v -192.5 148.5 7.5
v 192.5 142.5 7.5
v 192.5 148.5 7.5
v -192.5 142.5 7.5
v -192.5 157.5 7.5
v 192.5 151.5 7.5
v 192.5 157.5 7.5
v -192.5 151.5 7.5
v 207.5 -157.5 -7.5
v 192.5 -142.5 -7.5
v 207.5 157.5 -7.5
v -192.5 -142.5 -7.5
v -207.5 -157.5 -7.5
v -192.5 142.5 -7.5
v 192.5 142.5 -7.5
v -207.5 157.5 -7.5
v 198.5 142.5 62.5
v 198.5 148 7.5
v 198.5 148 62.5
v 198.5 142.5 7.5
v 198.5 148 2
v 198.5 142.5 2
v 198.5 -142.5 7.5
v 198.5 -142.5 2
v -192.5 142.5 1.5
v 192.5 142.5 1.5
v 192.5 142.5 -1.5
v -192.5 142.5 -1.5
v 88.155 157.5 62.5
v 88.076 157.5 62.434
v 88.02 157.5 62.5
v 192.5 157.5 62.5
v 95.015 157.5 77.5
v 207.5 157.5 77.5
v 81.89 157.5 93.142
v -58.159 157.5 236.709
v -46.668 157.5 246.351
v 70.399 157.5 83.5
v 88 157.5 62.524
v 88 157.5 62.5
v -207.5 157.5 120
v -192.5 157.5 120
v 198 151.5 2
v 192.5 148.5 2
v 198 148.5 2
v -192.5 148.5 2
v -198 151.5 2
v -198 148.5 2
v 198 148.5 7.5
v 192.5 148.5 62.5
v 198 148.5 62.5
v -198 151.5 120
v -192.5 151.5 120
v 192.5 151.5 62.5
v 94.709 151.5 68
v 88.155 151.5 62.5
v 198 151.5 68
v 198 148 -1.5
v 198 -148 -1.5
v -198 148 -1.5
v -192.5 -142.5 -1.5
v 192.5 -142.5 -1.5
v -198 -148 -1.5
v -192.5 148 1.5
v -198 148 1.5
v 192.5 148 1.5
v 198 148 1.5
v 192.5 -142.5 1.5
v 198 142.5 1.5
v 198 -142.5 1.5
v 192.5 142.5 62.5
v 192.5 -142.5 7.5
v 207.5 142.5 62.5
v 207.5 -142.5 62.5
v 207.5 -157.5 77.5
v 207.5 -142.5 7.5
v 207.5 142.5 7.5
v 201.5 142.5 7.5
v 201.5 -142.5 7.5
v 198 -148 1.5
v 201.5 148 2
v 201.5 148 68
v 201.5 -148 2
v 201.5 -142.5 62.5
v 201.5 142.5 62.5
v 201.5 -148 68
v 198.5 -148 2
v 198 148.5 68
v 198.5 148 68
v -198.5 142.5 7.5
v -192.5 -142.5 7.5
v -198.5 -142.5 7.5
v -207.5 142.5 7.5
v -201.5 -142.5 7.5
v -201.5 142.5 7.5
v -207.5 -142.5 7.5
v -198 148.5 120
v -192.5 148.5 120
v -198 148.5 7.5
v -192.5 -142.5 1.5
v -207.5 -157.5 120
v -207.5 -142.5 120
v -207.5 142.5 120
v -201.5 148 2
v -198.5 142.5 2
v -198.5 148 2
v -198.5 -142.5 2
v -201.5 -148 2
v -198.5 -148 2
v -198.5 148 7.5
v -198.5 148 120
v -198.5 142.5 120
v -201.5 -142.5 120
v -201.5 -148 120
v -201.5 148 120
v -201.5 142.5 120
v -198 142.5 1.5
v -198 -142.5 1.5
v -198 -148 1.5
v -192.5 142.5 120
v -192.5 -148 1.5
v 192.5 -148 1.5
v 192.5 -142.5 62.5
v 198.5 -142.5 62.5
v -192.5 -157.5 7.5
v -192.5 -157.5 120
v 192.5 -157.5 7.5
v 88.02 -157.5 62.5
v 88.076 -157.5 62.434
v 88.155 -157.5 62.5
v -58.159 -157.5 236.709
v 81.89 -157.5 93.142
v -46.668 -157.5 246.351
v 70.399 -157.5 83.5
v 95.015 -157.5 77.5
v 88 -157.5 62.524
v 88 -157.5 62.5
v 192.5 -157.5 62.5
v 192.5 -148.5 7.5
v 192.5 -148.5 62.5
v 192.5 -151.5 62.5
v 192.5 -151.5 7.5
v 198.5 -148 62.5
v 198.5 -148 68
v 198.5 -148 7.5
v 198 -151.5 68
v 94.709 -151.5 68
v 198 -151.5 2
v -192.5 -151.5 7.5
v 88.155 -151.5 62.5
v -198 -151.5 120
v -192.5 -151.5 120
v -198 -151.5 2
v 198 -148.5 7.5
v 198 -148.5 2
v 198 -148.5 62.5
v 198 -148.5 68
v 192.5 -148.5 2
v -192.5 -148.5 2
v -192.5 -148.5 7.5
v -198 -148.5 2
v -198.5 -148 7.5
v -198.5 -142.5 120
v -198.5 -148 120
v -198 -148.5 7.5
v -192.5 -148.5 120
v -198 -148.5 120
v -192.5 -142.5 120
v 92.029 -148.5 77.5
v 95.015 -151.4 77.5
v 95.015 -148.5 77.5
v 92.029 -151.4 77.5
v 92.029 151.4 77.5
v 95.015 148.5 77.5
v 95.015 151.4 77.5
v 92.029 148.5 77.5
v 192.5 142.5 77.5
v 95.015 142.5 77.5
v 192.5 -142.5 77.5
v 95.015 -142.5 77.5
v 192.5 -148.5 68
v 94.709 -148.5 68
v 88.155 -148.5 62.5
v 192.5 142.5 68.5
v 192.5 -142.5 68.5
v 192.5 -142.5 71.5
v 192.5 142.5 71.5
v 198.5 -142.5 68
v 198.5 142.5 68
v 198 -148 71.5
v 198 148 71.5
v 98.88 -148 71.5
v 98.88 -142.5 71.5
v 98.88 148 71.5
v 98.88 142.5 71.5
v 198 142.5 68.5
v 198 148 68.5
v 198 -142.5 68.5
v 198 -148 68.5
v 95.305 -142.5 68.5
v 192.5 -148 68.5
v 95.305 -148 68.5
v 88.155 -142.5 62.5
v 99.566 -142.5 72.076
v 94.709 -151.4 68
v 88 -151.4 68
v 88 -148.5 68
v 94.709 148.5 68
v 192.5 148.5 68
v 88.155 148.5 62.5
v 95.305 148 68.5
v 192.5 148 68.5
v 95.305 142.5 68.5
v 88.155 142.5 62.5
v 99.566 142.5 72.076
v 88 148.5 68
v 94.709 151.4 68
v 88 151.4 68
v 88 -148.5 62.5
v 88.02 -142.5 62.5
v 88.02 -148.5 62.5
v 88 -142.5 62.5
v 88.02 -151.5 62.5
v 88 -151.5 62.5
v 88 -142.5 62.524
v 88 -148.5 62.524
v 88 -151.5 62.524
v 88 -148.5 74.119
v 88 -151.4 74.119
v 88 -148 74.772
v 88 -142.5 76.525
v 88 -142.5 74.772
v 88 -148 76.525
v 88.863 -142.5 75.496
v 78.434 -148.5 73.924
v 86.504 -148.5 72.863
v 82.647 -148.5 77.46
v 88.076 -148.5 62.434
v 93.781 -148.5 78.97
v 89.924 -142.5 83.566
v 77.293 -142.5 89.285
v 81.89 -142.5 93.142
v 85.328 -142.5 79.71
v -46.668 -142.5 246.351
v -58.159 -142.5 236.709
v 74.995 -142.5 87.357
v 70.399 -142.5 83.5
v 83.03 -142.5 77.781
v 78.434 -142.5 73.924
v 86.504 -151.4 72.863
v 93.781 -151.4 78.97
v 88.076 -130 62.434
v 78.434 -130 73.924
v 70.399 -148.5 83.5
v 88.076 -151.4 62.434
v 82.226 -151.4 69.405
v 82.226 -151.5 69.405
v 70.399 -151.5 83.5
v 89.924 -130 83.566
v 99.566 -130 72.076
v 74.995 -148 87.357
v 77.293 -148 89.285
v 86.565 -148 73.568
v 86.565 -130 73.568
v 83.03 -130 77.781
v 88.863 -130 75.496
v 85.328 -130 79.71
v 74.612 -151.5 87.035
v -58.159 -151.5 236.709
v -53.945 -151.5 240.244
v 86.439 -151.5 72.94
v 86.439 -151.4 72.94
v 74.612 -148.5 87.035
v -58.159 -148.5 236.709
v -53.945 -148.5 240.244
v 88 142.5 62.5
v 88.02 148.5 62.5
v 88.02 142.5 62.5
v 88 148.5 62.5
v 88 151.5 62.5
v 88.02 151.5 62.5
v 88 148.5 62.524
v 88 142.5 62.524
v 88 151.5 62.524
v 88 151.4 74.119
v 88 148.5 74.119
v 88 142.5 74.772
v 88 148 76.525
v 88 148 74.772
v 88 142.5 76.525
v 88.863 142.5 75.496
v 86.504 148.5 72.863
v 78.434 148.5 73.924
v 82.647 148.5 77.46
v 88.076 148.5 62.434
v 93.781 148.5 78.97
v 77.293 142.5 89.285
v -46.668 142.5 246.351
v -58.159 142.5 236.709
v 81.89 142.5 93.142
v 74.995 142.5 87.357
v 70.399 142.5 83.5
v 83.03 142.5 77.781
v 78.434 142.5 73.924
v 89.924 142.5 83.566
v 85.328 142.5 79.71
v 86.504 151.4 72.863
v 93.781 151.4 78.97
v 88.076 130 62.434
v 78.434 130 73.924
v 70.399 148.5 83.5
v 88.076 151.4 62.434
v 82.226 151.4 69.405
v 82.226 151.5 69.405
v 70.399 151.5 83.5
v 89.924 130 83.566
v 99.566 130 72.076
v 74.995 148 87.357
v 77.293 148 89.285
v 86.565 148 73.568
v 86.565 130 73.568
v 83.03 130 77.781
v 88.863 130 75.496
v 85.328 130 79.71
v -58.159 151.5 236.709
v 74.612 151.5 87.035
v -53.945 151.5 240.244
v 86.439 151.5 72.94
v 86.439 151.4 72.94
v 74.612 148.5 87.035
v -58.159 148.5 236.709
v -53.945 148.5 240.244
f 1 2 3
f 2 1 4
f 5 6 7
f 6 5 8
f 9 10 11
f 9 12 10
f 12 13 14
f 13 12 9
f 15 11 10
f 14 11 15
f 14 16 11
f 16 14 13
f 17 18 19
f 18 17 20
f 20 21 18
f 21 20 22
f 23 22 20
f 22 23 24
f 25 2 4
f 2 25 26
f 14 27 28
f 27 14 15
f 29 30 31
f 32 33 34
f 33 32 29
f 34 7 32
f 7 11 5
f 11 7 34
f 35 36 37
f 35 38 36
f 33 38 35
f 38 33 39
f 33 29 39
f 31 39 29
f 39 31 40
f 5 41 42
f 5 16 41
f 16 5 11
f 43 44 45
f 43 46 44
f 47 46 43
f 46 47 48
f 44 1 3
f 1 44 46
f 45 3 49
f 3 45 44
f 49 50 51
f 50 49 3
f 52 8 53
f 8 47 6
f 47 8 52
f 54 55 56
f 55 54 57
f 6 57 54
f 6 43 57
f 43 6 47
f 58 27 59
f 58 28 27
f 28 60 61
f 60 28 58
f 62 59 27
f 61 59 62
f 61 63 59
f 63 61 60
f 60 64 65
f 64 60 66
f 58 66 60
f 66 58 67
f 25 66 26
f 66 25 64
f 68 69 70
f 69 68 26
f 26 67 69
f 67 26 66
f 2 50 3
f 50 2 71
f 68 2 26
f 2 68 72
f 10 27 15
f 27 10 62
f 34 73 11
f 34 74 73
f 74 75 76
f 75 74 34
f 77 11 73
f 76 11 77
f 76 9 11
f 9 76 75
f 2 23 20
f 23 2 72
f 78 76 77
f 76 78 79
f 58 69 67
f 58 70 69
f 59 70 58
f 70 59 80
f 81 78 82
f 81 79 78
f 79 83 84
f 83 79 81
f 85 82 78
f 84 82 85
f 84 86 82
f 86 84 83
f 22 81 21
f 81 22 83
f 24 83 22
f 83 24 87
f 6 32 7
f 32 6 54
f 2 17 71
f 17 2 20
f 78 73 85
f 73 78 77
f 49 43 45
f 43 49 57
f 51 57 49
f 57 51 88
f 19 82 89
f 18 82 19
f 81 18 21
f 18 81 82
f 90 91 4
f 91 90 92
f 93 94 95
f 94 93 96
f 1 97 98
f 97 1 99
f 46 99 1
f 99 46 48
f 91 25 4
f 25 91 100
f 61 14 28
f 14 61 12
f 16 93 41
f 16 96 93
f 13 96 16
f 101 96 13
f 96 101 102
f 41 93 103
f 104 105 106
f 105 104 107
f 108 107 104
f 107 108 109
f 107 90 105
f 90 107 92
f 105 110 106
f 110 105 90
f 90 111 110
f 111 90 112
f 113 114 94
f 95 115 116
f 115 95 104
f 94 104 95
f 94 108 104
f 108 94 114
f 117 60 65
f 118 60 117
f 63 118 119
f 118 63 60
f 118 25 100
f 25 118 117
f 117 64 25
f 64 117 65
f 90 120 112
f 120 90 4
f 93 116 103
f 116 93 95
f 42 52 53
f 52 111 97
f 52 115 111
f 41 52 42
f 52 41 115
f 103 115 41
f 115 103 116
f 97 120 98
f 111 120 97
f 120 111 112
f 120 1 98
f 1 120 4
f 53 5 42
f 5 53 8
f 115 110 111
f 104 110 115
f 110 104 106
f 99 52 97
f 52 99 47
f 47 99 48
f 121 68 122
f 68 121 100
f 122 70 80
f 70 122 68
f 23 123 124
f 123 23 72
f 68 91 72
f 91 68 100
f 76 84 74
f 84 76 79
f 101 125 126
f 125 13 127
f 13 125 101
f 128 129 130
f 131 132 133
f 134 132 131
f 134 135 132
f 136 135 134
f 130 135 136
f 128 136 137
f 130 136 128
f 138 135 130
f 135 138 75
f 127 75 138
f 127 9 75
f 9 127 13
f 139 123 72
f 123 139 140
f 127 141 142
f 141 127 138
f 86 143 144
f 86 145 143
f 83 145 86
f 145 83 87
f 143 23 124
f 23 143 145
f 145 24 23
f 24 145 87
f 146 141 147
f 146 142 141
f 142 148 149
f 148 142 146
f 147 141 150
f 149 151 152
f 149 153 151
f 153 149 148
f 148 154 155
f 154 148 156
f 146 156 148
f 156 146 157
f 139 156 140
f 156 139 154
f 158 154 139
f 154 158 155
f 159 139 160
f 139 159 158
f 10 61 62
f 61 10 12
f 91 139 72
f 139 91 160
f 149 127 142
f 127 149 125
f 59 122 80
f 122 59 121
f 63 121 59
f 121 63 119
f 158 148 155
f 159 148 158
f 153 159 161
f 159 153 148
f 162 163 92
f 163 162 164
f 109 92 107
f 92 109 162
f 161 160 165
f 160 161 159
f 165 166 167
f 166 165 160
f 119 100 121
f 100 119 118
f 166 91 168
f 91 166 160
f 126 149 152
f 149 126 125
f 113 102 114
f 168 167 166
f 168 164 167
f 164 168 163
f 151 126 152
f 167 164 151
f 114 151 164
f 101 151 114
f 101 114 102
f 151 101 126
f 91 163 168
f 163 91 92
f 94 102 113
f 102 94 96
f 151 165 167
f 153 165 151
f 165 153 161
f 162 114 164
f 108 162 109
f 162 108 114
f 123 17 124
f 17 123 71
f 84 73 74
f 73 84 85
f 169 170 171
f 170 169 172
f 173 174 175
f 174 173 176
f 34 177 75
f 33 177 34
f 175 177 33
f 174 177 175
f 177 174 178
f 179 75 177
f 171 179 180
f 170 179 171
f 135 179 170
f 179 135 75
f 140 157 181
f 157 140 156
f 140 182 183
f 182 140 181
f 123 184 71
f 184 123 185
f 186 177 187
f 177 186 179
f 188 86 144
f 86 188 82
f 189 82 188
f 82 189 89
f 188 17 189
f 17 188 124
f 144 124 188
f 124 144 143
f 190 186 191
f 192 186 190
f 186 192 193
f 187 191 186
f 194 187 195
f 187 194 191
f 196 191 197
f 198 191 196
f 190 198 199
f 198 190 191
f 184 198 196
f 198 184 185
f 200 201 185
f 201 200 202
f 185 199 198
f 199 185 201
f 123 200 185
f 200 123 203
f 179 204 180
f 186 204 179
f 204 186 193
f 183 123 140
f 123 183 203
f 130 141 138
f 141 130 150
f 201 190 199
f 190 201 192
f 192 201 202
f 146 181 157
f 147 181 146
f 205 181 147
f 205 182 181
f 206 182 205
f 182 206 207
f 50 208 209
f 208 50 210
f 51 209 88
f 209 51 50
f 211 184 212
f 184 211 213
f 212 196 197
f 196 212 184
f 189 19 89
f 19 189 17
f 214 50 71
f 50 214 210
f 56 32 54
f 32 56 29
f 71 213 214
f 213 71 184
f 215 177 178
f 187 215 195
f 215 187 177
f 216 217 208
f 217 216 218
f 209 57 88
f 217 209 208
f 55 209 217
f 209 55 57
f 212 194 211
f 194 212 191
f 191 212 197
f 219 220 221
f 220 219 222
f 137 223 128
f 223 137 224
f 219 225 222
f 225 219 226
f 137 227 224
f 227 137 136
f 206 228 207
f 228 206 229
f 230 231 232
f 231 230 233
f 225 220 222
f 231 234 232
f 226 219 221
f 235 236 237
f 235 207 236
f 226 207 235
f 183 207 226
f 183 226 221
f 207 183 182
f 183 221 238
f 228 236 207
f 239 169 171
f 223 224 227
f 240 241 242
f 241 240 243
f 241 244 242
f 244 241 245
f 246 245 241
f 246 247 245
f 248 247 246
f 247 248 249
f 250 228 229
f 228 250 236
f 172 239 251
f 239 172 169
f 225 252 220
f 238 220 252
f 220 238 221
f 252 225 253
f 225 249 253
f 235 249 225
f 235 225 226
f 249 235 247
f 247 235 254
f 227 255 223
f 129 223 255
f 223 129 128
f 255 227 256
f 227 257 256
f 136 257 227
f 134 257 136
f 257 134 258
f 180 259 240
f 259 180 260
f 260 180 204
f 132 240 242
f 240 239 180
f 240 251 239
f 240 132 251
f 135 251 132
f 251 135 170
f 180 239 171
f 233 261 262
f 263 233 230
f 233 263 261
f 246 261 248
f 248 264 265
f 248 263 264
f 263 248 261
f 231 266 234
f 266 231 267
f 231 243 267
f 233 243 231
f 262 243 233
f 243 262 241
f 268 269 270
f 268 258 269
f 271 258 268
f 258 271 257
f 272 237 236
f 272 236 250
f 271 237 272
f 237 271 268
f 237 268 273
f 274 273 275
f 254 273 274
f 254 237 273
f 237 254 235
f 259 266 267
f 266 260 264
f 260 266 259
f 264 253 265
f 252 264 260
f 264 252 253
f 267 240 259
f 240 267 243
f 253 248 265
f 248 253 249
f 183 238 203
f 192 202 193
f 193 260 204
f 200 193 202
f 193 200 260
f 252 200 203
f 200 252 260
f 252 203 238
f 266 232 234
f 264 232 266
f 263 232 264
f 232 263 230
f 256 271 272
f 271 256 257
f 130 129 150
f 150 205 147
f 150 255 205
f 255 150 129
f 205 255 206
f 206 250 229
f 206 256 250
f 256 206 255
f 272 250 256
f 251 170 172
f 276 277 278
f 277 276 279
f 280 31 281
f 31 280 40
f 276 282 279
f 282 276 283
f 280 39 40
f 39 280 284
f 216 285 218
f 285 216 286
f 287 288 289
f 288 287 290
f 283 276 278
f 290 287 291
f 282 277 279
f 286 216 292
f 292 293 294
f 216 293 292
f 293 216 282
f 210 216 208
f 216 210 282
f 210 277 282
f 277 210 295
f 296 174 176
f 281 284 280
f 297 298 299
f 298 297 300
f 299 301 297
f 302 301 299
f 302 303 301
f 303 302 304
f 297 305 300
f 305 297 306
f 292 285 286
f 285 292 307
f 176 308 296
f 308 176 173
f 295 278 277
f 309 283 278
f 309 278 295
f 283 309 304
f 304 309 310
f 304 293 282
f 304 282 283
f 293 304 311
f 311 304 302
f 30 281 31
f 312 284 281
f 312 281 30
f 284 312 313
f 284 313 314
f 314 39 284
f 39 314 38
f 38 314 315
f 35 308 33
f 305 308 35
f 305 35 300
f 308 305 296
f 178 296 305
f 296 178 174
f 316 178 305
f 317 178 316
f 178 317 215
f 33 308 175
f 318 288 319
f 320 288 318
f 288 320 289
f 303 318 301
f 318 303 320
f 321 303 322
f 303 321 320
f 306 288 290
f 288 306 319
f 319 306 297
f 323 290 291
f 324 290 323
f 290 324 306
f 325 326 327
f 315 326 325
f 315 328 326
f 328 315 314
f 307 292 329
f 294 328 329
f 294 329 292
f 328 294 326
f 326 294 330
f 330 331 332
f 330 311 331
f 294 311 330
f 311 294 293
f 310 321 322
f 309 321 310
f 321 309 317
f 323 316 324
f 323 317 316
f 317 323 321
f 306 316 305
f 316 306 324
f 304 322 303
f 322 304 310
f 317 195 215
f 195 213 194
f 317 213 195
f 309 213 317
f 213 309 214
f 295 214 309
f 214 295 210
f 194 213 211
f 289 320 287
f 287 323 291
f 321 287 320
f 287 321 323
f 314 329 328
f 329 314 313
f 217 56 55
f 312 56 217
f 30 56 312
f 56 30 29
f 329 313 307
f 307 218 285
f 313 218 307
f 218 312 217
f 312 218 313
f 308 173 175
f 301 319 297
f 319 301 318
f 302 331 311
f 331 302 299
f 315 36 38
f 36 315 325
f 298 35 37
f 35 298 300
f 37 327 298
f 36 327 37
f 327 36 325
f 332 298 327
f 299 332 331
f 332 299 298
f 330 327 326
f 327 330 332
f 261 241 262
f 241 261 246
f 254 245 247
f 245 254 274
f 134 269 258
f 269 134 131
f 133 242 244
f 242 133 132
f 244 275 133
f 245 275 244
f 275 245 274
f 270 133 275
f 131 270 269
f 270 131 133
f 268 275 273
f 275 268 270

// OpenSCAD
$fn = 20;
union()
{
  union()
  {
    translate(v = [200, 150, 0])
    {
      rotate(a = [0, 0, 180], v = undef)
      {
        union()
        {
          translate(v = [100.75, 0, 0])
          {
            difference()
            {
              difference()
              {
                cube(size = [198.5, 15, 15], center = true);
                translate(v = [0, 0, 5.5])
                {
                  cube(size = [199.5, 3, 7], center = true);
                }
              }
              rotate(a = [-90, 0, 0], v = undef)
              {
                translate(v = [0, 0, 5.5])
                {
                  cube(size = [199.5, 3, 7], center = true);
                }
              }
            }
          }
          translate(v = [0, 75.75, 0])
          {
            rotate(a = [90, 0, 90], v = undef)
            {
              difference()
              {
                difference()
                {
                  cube(size = [148.5, 15, 15], center = true);
                  translate(v = [0, 0, 5.5])
                  {
                    cube(size = [149.5, 3, 7], center = true);
                  }
                }
                rotate(a = [-90, 0, 0], v = undef)
                {
                  translate(v = [0, 0, 5.5])
                  {
                    cube(size = [149.5, 3, 7], center = true);
                  }
                }
              }
            }
          }
          translate(v = [-2.95, -2.95, 0])
          {
            cube(size = [9.1, 9.1, 15], center = true);
          }
          translate(v = [0, 0, 25.75])
          {
            rotate(a = [0, 90, 0], v = undef)
            {
              difference()
              {
                difference()
                {
                  cube(size = [48.5, 15, 15], center = true);
                  translate(v = [0, 0, 5.5])
                  {
                    cube(size = [49.5, 3, 7], center = true);
                  }
                }
                rotate(a = [-90, 0, 0], v = undef)
                {
                  translate(v = [0, 0, 5.5])
                  {
                    cube(size = [49.5, 3, 7], center = true);
                  }
                }
              }
            }
          }
        }
      }
    }
    translate(v = [-200, 150, 0])
    {
      rotate(a = [0, 0, -90], v = undef)
      {
        union()
        {
          translate(v = [75.75, 0, 0])
          {
            difference()
            {
              difference()
              {
                cube(size = [148.5, 15, 15], center = true);
                translate(v = [0, 0, 5.5])
                {
                  cube(size = [149.5, 3, 7], center = true);
                }
              }
              rotate(a = [-90, 0, 0], v = undef)
              {
                translate(v = [0, 0, 5.5])
                {
                  cube(size = [149.5, 3, 7], center = true);
                }
              }
            }
          }
          translate(v = [0, 100.75, 0])
          {
            rotate(a = [90, 0, 90], v = undef)
            {
              difference()
              {
                difference()
                {
                  cube(size = [198.5, 15, 15], center = true);
                  translate(v = [0, 0, 5.5])
                  {
                    cube(size = [199.5, 3, 7], center = true);
                  }
                }
                rotate(a = [-90, 0, 0], v = undef)
                {
                  translate(v = [0, 0, 5.5])
                  {
                    cube(size = [199.5, 3, 7], center = true);
                  }
                }
              }
            }
          }
          translate(v = [-2.95, -2.95, 0])
          {
            cube(size = [9.1, 9.1, 15], center = true);
          }
          translate(v = [0, 0, 60.75])
          {
            rotate(a = [0, 90, 0], v = undef)
            {
              difference()
              {
                difference()
                {
                  cube(size = [118.5, 15, 15], center = true);
                  translate(v = [0, 0, 5.5])
                  {
                    cube(size = [119.5, 3, 7], center = true);
                  }
                }
                rotate(a = [-90, 0, 0], v = undef)
                {
                  translate(v = [0, 0, 5.5])
                  {
                    cube(size = [119.5, 3, 7], center = true);
                  }
                }
              }
            }
          }
        }
      }
    }
    translate(v = [200, -150, 0])
    {
      rotate(a = [0, 0, 90], v = undef)
      {
        union()
        {
          translate(v = [75.75, 0, 0])
          {
            difference()
            {
              difference()
              {
                cube(size = [148.5, 15, 15], center = true);
                translate(v = [0, 0, 5.5])
                {
                  cube(size = [149.5, 3, 7], center = true);
                }
              }
              rotate(a = [-90, 0, 0], v = undef)
              {
                translate(v = [0, 0, 5.5])
                {
                  cube(size = [149.5, 3, 7], center = true);
                }
              }
            }
          }
          translate(v = [0, 100.75, 0])
          {
            rotate(a = [90, 0, 90], v = undef)
            {
              difference()
              {
                difference()
                {
                  cube(size = [198.5, 15, 15], center = true);
                  translate(v = [0, 0, 5.5])
                  {
                    cube(size = [199.5, 3, 7], center = true);
                  }
                }
                rotate(a = [-90, 0, 0], v = undef)
                {
                  translate(v = [0, 0, 5.5])
                  {
                    cube(size = [199.5, 3, 7], center = true);
                  }
                }
              }
            }
          }
          translate(v = [-2.95, -2.95, 0])
          {
            cube(size = [9.1, 9.1, 15], center = true);
          }
          translate(v = [0, 0, 25.75])
          {
            rotate(a = [0, 90, 0], v = undef)
            {
              difference()
              {
                difference()
                {
                  cube(size = [48.5, 15, 15], center = true);
                  translate(v = [0, 0, 5.5])
                  {
                    cube(size = [49.5, 3, 7], center = true);
                  }
                }
                rotate(a = [-90, 0, 0], v = undef)
                {
                  translate(v = [0, 0, 5.5])
                  {
                    cube(size = [49.5, 3, 7], center = true);
                  }
                }
              }
            }
          }
        }
      }
    }
    translate(v = [-200, -150, 0])
    {
      rotate(a = [0, 0, 0], v = undef)
      {
        union()
        {
          translate(v = [100.75, 0, 0])
          {
            difference()
            {
              difference()
              {
                cube(size = [198.5, 15, 15], center = true);
                translate(v = [0, 0, 5.5])
                {
                  cube(size = [199.5, 3, 7], center = true);
                }
              }
              rotate(a = [-90, 0, 0], v = undef)
              {
                translate(v = [0, 0, 5.5])
                {
                  cube(size = [199.5, 3, 7], center = true);
                }
              }
            }
          }
          translate(v = [0, 75.75, 0])
          {
            rotate(a = [90, 0, 90], v = undef)
            {
              difference()
              {
                difference()
                {
                  cube(size = [148.5, 15, 15], center = true);
                  translate(v = [0, 0, 5.5])
                  {
                    cube(size = [149.5, 3, 7], center = true);
                  }
                }
                rotate(a = [-90, 0, 0], v = undef)
                {
                  translate(v = [0, 0, 5.5])
                  {
                    cube(size = [149.5, 3, 7], center = true);
                  }
                }
              }
            }
          }
          translate(v = [-2.95, -2.95, 0])
          {
            cube(size = [9.1, 9.1, 15], center = true);
          }
          translate(v = [0, 0, 60.75])
          {
            rotate(a = [0, 90, 0], v = undef)
            {
              difference()
              {
                difference()
                {
                  cube(size = [118.5, 15, 15], center = true);
                  translate(v = [0, 0, 5.5])
                  {
                    cube(size = [119.5, 3, 7], center = true);
                  }
                }
                rotate(a = [-90, 0, 0], v = undef)
                {
                  translate(v = [0, 0, 5.5])
                  {
                    cube(size = [119.5, 3, 7], center = true);
                  }
                }
              }
            }
          }
        }
      }
    }
  }
  translate(v = [100, 0, 70])
  {
    rotate(a = [0, 0, 90], v = undef)
    {
      mirror(v = [0, 0, 1])
      {
        union()
        {
          translate(v = [-150, -100, 0])
          {
            union()
            {
              translate(v = [75.75, 0, 0])
              {
                difference()
                {
                  difference()
                  {
                    cube(size = [148.5, 15, 15], center = true);
                    translate(v = [0, 0, 5.5])
                    {
                      cube(size = [149.5, 3, 7], center = true);
                    }
                  }
                  rotate(a = [-90, 0, 0], v = undef)
                  {
                    translate(v = [0, 0, 5.5])
                    {
                      cube(size = [149.5, 3, 7], center = true);
                    }
                  }
                }
              }
              translate(v = [0, 50.75, 0])
              {
                rotate(a = [90, 0, 90], v = undef)
                {
                  difference()
                  {
                    difference()
                    {
                      cube(size = [98.5, 15, 15], center = true);
                      translate(v = [0, 0, 5.5])
                      {
                        cube(size = [99.5, 3, 7], center = true);
                      }
                    }
                    rotate(a = [-90, 0, 0], v = undef)
                    {
                      translate(v = [0, 0, 5.5])
                      {
                        cube(size = [99.5, 3, 7], center = true);
                      }
                    }
                  }
                }
              }
              translate(v = [-2.95, -2.95, 0])
              {
                cube(size = [9.1, 9.1, 15], center = true);
              }
              translate(v = [0, 0, 10.75])
              {
                rotate(a = [0, 90, 0], v = undef)
                {
                  difference()
                  {
                    difference()
                    {
                      cube(size = [18.5, 15, 15], center = true);
                      translate(v = [0, 0, 5.5])
                      {
                        cube(size = [19.5, 3, 7], center = true);
                      }
                    }
                    rotate(a = [-90, 0, 0], v = undef)
                    {
                      translate(v = [0, 0, 5.5])
                      {
                        cube(size = [19.5, 3, 7], center = true);
                      }
                    }
                  }
                }
              }
            }
          }
          translate(v = [150, -100, 0])
          {
            rotate(a = [0, 0, 90], v = undef)
            {
              union()
              {
                translate(v = [50.75, 0, 0])
                {
                  difference()
                  {
                    difference()
                    {
                      cube(size = [98.5, 15, 15], center = true);
                      translate(v = [0, 0, 5.5])
                      {
                        cube(size = [99.5, 3, 7], center = true);
                      }
                    }
                    rotate(a = [-90, 0, 0], v = undef)
                    {
                      translate(v = [0, 0, 5.5])
                      {
                        cube(size = [99.5, 3, 7], center = true);
                      }
                    }
                  }
                }
                translate(v = [0, 75.75, 0])
                {
                  rotate(a = [90, 0, 90], v = undef)
                  {
                    difference()
                    {
                      difference()
                      {
                        cube(size = [148.5, 15, 15], center = true);
                        translate(v = [0, 0, 5.5])
                        {
                          cube(size = [149.5, 3, 7], center = true);
                        }
                      }
                      rotate(a = [-90, 0, 0], v = undef)
                      {
                        translate(v = [0, 0, 5.5])
                        {
                          cube(size = [149.5, 3, 7], center = true);
                        }
                      }
                    }
                  }
                }
                translate(v = [-2.95, -2.95, 0])
                {
                  cube(size = [9.1, 9.1, 15], center = true);
                }
                translate(v = [0, 0, 10.75])
                {
                  rotate(a = [0, 90, 0], v = undef)
                  {
                    difference()
                    {
                      difference()
                      {
                        cube(size = [18.5, 15, 15], center = true);
                        translate(v = [0, 0, 5.5])
                        {
                          cube(size = [19.5, 3, 7], center = true);
                        }
                      }
                      rotate(a = [-90, 0, 0], v = undef)
                      {
                        translate(v = [0, 0, 5.5])
                        {
                          cube(size = [19.5, 3, 7], center = true);
                        }
                      }
                    }
                  }
                }
              }
            }
          }
          translate(v = [-150, 6, 0])
          {
            rotate(a = [0, 0, -90], v = undef)
            {
              union()
              {
                difference()
                {
                  difference()
                  {
                    cube(size = [12, 15, 15], center = true);
                    translate(v = [0, 0, 5.5])
                    {
                      cube(size = [13, 3, 7], center = true);
                    }
                  }
                  rotate(a = [-90, 0, 0], v = undef)
                  {
                    translate(v = [0, 0, 5.5])
                    {
                      cube(size = [13, 3, 7], center = true);
                    }
                  }
                }
                translate(v = [-5, 0, -3])
                {
                  rotate(a = [0, 130, 0], v = undef)
                  {
                    union()
                    {
                      rotate(a = [-90, 0, 0], v = undef)
                      {
                        translate(v = [10.75, 0, 0])
                        {
                          difference()
                          {
                            difference()
                            {
                              cube(size = [18.5, 15, 15], center = true);
                              translate(v = [0, 0, 5.5])
                              {
                                cube(size = [19.5, 3, 7], center = true);
                              }
                            }
                            rotate(a = [-90, 0, 0], v = undef)
                            {
                              translate(v = [-5, 0, 5.5])
                              {
                                cube(size = [28.5, 3, 7], center = true);
                              }
                            }
                          }
                        }
                      }
                      rotate(a = [0, 90, 0], v = undef)
                      {
                        translate(v = [0, 10.75, 0])
                        {
                          rotate(a = [0, 0, 90], v = undef)
                          {
                            difference()
                            {
                              cube(size = [18.5, 15, 15], center = true);
                              translate(v = [0, 0, 5.5])
                              {
                                cube(size = [19.5, 3, 7], center = true);
                              }
                            }
                          }
                        }
                      }
                      translate(v = [-2.95, -4.45, 0])
                      {
                        cube(size = [9.1, 6.1, 15], center = true);
                      }
                    }
                  }
                }
              }
            }
          }
          translate(v = [150, 6, 0])
          {
            mirror(v = [1, 0, 0])
            {
              rotate(a = [0, 0, -90], v = undef)
              {
                union()
                {
                  difference()
                  {
                    difference()
                    {
                      cube(size = [12, 15, 15], center = true);
                      translate(v = [0, 0, 5.5])
                      {
                        cube(size = [13, 3, 7], center = true);
                      }
                    }
                    rotate(a = [-90, 0, 0], v = undef)
                    {
                      translate(v = [0, 0, 5.5])
                      {
                        cube(size = [13, 3, 7], center = true);
                      }
                    }
                  }
                  translate(v = [-5, 0, -3])
                  {
                    rotate(a = [0, 130, 0], v = undef)
                    {
                      union()
                      {
                        rotate(a = [-90, 0, 0], v = undef)
                        {
                          translate(v = [10.75, 0, 0])
                          {
                            difference()
                            {
                              difference()
                              {
                                cube(size = [18.5, 15, 15], center = true);
                                translate(v = [0, 0, 5.5])
                                {
                                  cube(size = [19.5, 3, 7], center = true);
                                }
                              }
                              rotate(a = [-90, 0, 0], v = undef)
                              {
                                translate(v = [-5, 0, 5.5])
                                {
                                  cube(size = [28.5, 3, 7], center = true);
                                }
                              }
                            }
                          }
                        }
                        rotate(a = [0, 90, 0], v = undef)
                        {
                          translate(v = [0, 10.75, 0])
                          {
                            rotate(a = [0, 0, 90], v = undef)
                            {
                              difference()
                              {
                                cube(size = [18.5, 15, 15], center = true);
                                translate(v = [0, 0, 5.5])
                                {
                                  cube(size = [19.5, 3, 7], center = true);
                                }
                              }
                            }
                          }
                        }
                        translate(v = [-2.95, -4.45, 0])
                        {
                          cube(size = [9.1, 6.1, 15], center = true);
                        }
                      }
                    }
                  }
                }
              }
            }
          }
        }
      }
    }
  }
  union()
  {
    translate(v = [11.86548683761528, 150, 164.92533317427734])
    {
      rotate(a = [180, 50, 0], v = undef)
      {
        difference()
        {
          cube(size = [200, 15, 15], center = true);
          translate(v = [0, 0, 5.5])
          {
            cube(size = [201, 3, 7], center = true);
          }
        }
      }
    }
    mirror(v = [0, 1, 0])
    {
      translate(v = [11.86548683761528, 150, 164.92533317427734])
      {
        rotate(a = [180, 50, 0], v = undef)
        {
          difference()
          {
            cube(size = [200, 15, 15], center = true);
            translate(v = [0, 0, 5.5])
            {
              cube(size = [201, 3, 7], center = true);
            }
          }
        }
      }
    }
  }
}
